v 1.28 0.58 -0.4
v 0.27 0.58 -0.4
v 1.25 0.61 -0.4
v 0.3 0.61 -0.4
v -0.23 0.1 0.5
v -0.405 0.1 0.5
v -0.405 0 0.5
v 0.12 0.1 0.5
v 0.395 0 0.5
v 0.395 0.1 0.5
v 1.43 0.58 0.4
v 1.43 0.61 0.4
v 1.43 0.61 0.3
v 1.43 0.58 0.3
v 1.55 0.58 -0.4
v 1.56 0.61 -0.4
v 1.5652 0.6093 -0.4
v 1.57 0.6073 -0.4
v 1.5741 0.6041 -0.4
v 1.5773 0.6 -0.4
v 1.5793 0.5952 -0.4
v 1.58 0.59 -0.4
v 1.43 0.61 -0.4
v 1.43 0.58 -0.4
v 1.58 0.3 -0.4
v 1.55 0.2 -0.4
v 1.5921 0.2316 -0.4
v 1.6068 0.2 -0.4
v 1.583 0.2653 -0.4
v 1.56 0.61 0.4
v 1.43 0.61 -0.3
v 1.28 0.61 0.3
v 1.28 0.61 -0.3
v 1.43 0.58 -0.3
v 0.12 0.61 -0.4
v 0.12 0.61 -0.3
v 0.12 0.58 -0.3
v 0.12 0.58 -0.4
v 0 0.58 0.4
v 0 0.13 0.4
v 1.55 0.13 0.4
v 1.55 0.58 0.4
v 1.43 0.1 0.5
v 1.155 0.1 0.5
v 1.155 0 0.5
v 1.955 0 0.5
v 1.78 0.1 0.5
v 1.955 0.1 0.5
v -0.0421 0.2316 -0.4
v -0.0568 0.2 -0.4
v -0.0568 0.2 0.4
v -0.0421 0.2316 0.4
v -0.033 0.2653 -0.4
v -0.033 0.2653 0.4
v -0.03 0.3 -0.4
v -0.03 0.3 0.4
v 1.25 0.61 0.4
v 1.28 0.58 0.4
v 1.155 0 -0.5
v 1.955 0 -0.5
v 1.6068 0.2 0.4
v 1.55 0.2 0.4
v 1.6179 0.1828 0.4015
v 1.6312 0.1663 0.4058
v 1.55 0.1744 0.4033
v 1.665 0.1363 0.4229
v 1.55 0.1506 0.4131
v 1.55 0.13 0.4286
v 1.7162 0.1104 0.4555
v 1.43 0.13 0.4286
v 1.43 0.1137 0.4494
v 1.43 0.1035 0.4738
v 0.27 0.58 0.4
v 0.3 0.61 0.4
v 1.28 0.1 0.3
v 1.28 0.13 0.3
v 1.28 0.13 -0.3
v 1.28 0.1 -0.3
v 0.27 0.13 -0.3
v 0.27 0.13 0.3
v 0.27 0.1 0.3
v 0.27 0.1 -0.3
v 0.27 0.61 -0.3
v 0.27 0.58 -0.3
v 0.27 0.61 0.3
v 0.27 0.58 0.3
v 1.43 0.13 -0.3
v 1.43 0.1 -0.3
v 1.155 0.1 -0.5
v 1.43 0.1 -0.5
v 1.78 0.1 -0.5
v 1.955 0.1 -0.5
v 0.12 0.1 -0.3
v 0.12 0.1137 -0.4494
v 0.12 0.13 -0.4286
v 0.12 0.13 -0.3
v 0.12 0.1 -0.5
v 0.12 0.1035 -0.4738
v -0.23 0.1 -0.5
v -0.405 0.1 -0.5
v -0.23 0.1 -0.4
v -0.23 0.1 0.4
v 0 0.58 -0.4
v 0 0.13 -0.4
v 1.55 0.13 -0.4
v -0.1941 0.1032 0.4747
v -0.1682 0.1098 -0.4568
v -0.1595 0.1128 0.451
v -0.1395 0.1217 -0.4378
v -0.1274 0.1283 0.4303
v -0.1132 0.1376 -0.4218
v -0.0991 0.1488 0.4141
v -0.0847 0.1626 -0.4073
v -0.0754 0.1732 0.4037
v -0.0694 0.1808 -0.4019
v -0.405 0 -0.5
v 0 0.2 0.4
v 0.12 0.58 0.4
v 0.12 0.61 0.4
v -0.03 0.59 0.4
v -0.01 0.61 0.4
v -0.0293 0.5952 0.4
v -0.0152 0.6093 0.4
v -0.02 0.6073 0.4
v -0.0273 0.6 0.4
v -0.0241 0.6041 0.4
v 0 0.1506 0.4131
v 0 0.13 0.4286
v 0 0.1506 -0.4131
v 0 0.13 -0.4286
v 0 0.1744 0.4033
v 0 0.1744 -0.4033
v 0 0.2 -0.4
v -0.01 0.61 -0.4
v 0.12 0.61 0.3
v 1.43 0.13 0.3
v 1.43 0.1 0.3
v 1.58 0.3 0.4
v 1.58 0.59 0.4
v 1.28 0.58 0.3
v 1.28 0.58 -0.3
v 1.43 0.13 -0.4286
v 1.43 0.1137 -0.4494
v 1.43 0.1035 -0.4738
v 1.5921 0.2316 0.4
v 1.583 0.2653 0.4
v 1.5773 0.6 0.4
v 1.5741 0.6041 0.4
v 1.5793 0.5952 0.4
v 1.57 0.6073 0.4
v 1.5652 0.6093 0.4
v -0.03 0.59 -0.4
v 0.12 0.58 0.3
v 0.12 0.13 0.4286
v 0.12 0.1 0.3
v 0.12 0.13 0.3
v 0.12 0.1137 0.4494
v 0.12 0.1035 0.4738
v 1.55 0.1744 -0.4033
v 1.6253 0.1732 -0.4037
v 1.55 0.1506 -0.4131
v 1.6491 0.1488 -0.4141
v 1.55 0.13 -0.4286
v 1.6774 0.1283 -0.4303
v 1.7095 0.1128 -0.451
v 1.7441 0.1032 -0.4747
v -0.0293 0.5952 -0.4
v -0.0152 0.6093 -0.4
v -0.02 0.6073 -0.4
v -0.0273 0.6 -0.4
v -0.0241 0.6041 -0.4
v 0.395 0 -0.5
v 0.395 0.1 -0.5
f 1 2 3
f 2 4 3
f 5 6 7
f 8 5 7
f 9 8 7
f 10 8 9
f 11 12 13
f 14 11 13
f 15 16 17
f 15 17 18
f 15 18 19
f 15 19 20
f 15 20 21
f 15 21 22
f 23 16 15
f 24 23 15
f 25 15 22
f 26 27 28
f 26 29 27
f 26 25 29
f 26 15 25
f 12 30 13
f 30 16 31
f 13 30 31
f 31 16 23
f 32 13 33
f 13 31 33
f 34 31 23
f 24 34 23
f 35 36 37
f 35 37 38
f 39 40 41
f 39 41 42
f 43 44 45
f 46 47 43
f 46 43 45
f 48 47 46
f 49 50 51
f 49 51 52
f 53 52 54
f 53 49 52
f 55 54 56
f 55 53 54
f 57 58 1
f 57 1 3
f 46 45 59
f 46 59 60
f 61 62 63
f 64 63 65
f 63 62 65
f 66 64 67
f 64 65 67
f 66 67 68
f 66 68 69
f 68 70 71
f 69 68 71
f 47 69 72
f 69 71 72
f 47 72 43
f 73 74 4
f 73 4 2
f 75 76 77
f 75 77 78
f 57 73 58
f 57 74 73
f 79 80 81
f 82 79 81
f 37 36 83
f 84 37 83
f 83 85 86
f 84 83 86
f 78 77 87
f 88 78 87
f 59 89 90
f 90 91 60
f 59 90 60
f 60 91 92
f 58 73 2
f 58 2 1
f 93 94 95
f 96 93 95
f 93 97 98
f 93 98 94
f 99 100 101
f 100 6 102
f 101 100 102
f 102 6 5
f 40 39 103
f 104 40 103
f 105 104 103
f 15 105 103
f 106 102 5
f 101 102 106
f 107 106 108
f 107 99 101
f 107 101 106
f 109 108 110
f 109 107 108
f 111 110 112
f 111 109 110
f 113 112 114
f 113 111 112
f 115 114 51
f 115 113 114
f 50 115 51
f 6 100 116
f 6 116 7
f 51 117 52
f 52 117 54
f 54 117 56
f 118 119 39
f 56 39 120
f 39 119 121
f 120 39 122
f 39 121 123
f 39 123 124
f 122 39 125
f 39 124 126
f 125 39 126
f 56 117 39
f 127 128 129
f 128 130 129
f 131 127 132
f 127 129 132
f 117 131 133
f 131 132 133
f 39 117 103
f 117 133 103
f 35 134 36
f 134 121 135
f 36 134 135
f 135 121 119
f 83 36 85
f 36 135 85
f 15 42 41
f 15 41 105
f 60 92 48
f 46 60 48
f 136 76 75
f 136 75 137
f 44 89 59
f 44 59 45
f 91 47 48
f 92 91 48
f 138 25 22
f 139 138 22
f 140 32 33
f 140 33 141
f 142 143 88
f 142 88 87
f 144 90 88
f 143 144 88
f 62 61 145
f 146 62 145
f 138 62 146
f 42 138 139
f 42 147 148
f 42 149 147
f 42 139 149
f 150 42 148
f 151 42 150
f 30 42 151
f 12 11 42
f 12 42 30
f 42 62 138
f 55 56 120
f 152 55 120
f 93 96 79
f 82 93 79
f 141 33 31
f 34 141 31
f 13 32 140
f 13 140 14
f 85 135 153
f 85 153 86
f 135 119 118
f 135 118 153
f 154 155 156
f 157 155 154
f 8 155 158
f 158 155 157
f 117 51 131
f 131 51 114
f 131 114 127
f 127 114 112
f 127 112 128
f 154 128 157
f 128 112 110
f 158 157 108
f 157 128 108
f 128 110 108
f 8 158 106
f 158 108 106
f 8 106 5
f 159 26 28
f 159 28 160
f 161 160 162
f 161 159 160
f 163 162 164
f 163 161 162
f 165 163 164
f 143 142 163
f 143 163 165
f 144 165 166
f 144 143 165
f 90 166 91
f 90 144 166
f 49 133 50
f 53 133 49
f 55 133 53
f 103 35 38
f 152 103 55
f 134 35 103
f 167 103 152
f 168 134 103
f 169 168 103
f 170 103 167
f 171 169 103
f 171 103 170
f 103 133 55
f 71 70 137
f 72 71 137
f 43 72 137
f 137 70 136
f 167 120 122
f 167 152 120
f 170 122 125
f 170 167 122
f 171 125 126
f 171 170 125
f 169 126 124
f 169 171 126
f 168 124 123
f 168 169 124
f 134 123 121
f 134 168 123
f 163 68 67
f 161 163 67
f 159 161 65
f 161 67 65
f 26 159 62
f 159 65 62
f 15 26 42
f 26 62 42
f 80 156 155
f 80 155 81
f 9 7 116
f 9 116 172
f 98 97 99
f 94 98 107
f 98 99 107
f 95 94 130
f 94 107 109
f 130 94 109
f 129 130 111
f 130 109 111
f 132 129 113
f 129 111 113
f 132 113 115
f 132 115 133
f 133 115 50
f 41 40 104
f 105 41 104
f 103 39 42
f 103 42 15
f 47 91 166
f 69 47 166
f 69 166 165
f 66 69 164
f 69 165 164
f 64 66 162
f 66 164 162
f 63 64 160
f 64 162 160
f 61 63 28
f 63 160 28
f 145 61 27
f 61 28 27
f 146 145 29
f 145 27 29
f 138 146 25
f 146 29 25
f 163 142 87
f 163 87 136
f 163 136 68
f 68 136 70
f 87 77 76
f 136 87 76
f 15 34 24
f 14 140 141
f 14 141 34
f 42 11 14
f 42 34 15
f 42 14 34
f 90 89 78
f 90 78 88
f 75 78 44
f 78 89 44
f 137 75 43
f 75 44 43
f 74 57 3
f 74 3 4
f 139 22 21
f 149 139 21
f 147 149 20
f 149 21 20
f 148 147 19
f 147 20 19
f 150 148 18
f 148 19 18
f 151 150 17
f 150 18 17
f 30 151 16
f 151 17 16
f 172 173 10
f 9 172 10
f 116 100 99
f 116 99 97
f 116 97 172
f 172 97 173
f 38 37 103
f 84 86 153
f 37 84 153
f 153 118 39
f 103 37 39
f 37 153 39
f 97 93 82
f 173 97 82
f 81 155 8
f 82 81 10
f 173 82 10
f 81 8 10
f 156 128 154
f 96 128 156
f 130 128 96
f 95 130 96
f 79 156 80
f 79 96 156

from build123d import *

# Parameters (mm, degrees)
SKETCH1_W             = 0.8
SKETCH1_H             = 0.45
BOSS_EXTRUDE1_DEPTH   = 1.55
BOSS_EXTRUDE2_DEPTH   = 0.8
BOSS_EXTRUDE2_2_DEPTH = 0.8
FILLET1_R             = 0.02
FILLET2_R             = 0.02
SKETCH3_W             = 0.15
SKETCH3_H             = 0.1
CUT_EXTRUDE1_DEPTH    = 2.707776332
BOSS_EXTRUDE3_DEPTH   = 0.8
SKETCH5_W             = 0.8
SKETCH5_H             = 1
BOSS_EXTRUDE4_DEPTH   = 0.1
FILLET3_R             = 0.2
FILLET4_R             = 0.2
FILLET5_START         = -0.087971281
FILLET5_DEPTH         = 0.087971281
FILLET5_START_2       = -0.2300001
FILLET5_2_DEPTH       = 0.142028819
FILLET5_START_3       = -0.0299999
FILLET5_3_DEPTH       = 0.1499999
FILLET5_START_4       = -2
FILLET5_4_OUTLINE_W   = 0.12
FILLET5_4_OUTLINE_H   = 0.07
FILLET5_4_DEPTH       = 3
FILLET6_START         = 1.43
FILLET6_DEPTH         = 0.209188627
FILLET6_START_2       = 1.55
FILLET6_2_DEPTH       = 0.0299999
FILLET6_START_3       = -0.5
FILLET6_3_DEPTH       = 1
FILLET6_START_4       = -0.3
FILLET6_4_OUTLINE_W   = 0.359188627
FILLET6_4_OUTLINE_H   = 0.03
FILLET6_4_OUTLINE_W_2 = 0.15
FILLET6_4_DEPTH       = 0.6
FILLET6_5_OUTLINE_W   = 0.209188627
FILLET6_5_OUTLINE_H   = 0.03
FILLET6_5_DEPTH       = 0.9
FILLET6_6_DEPTH       = 0.35


with BuildPart() as part:
    # Sketch1 → Boss-Extrude1 (new body)
    with BuildSketch(Plane(origin=(0, 0, 0), x_dir=(0, 0, -1), z_dir=(1, 0, 0))):
        with Locations((0, 0.355)):
            Rectangle(SKETCH1_W, SKETCH1_H)
    extrude(amount=BOSS_EXTRUDE1_DEPTH)


with BuildPart() as body_2:
    # Sketch2 → Boss-Extrude2 (new body)
    with BuildSketch(Plane.XY.offset(0.4)):
        Polygon((0.27, 0.58), (0, 0.58), (0, 0.13), (0.27, 0.13), (0.27, 0.1), (-0.03, 0.1), (-0.03, 0.61), (0.27, 0.61), align=None)
    extrude(amount=-BOSS_EXTRUDE2_DEPTH)

    # Fillet2
    fillet2_edges = [body_2.edges().sort_by_distance(p)[0] for p in [
        (-0.03, 0.61, 0),
    ]]
    fillet(fillet2_edges, radius=FILLET2_R)


with BuildPart() as body_3:
    # Sketch2 → Boss-Extrude2 2 (new body)
    with BuildSketch(Plane.XY.offset(0.4)):
        Polygon((1.28, 0.13), (1.28, 0.1), (1.58, 0.1), (1.58, 0.61), (1.28, 0.61), (1.28, 0.58), (1.55, 0.58), (1.55, 0.13), align=None)
    extrude(amount=-BOSS_EXTRUDE2_2_DEPTH)

    # Fillet1
    fillet1_edges = [body_3.edges().sort_by_distance(p)[0] for p in [
        (1.58, 0.61, 0),
    ]]
    fillet(fillet1_edges, radius=FILLET1_R)


with BuildPart() as cut_extrude1_tool:
    # Sketch3 → Cut-Extrude1 (new, through all)
    with BuildSketch(Plane(origin=(0, 0.61, 0), x_dir=(1, 0, 0), z_dir=(0, 1, 0))):
        with Locations((0.195, 0.35)):
            Rectangle(SKETCH3_W, SKETCH3_H)
        with Locations((1.355, 0.35)):
            Rectangle(SKETCH3_W, SKETCH3_H)
        with Locations((1.355, -0.35)):
            Rectangle(SKETCH3_W, SKETCH3_H)
        with Locations((0.195, -0.35)):
            Rectangle(SKETCH3_W, SKETCH3_H)
    extrude(amount=-CUT_EXTRUDE1_DEPTH)


with BuildPart() as body_2_1:
    add(body_2.part)

    # Cut-Extrude1: cut by cut_extrude1_tool
    add(cut_extrude1_tool.part, mode=Mode.SUBTRACT)



with BuildPart() as body_3_1:
    add(body_3.part)

    # Cut-Extrude1: cut by cut_extrude1_tool
    add(cut_extrude1_tool.part, mode=Mode.SUBTRACT)


with BuildPart() as body_4:
    # Sketch4 → Boss-Extrude3 (new body)
    with BuildSketch(Plane.XY.offset(0.4)):
        Polygon((0.27, 0.58), (1.28, 0.58), (1.25, 0.61), (0.3, 0.61), align=None)
    extrude(amount=-BOSS_EXTRUDE3_DEPTH)


with BuildPart() as body_2_2:
    add(body_2_1.part)

    add(body_3_1.part)  # Boss-Extrude4 merges body 3
    # Sketch5 → Boss-Extrude4 (add)
    with BuildSketch(Plane.XZ.offset(-0.1)):
        with Locations((-0.005, 0)):
            Rectangle(SKETCH5_W, SKETCH5_H)
        with Locations((1.555, 0)):
            Rectangle(SKETCH5_W, SKETCH5_H)
    extrude(amount=BOSS_EXTRUDE4_DEPTH)

    # Fillet3
    fillet3_edges = [body_2_2.edges().sort_by_distance(p)[0] for p in [
        (-0.03, 0.1, 0),
    ]]
    fillet(fillet3_edges, radius=FILLET3_R)

    # Fillet4
    fillet4_edges = [body_2_2.edges().sort_by_distance(p)[0] for p in [
        (1.58, 0.1, 0),
    ]]
    fillet(fillet4_edges, radius=FILLET4_R)

    # Fillet5: read off the stored shape, not the designer's step
    # Fillet5 outline → Fillet5 (add)
    with BuildSketch(Plane.YZ.offset(FILLET5_START)):
        with BuildLine():
            Line((0.1, 0.5), (0.1, 0.4))
            Line((0.1, 0.4), (0.2, 0.4))
            ThreePointArc((0.2, 0.4), (0.129289322, 0.429289322), (0.1, 0.5))
        make_face()
        with BuildLine():
            ThreePointArc((0.1, -0.5), (0.129289322, -0.429289322), (0.2, -0.4))
            Line((0.2, -0.4), (0.1, -0.4))
            Line((0.1, -0.4), (0.1, -0.5))
        make_face()
    extrude(amount=FILLET5_DEPTH)

    # Fillet5 2 outline → Fillet5 2 (add)
    with BuildSketch(Plane.YZ.offset(FILLET5_START_2)):
        with BuildLine():
            Line((0.1, 0.5), (0.1, 0.4))
            Line((0.1, 0.4), (0.2, 0.4))
            ThreePointArc((0.2, 0.4), (0.129289322, 0.429289322), (0.1, 0.5))
        make_face()
        with BuildLine():
            ThreePointArc((0.1, -0.5), (0.129289322, -0.429289322), (0.2, -0.4))
            Line((0.2, -0.4), (0.1, -0.4))
            Line((0.1, -0.4), (0.1, -0.5))
        make_face()
    extrude(amount=FILLET5_2_DEPTH)

    # Fillet5 3 outline → Fillet5 3 (add)
    with BuildSketch(Plane.YZ.offset(FILLET5_START_3)):
        with BuildLine():
            Line((0.1, 0.5), (0.1, 0.4))
            Line((0.1, 0.4), (0.2, 0.4))
            ThreePointArc((0.2, 0.4), (0.129289322, 0.429289322), (0.1, 0.5))
        make_face()
        with BuildLine():
            ThreePointArc((0.1, -0.5), (0.129289322, -0.429289322), (0.2, -0.4))
            Line((0.2, -0.4), (0.1, -0.4))
            Line((0.1, -0.4), (0.1, -0.5))
        make_face()
    extrude(amount=FILLET5_3_DEPTH)

    # Fillet5 4 outline → Fillet5 4 (cut)
    with BuildSketch(Plane.XY.offset(FILLET5_START_4)):
        with Locations((0.06, 0.165)):
            Rectangle(FILLET5_4_OUTLINE_W, FILLET5_4_OUTLINE_H)
        with BuildLine():
            Line((-0.2300001, 0.2), (-0.23000005, 0.1))
            ThreePointArc((-0.23000005, 0.1), (-0.130000022, 0.126794907), (-0.056794919, 0.2))
            Line((-0.056794919, 0.2), (-0.2300001, 0.2))
        make_face()
    extrude(amount=FILLET5_4_DEPTH, mode=Mode.SUBTRACT)

    # Fillet6: read off the stored shape, not the designer's step
    # Fillet6 outline → Fillet6 (add)
    with BuildSketch(Plane.YZ.offset(FILLET6_START)):
        with BuildLine():
            ThreePointArc((0.1, -0.5), (0.107804555, -0.461270167), (0.13, -0.428585716))
            Line((0.13, -0.428585716), (0.13, -0.4))
            Line((0.13, -0.4), (0.1, -0.4))
            Line((0.1, -0.4), (0.1, -0.5))
        make_face()
        with BuildLine():
            Line((0.1, 0.4), (0.13, 0.4))
            Line((0.13, 0.4), (0.13, 0.428585716))
            ThreePointArc((0.13, 0.428585716), (0.107804555, 0.461270167), (0.1, 0.5))
            Line((0.1, 0.5), (0.1, 0.4))
        make_face()
    extrude(amount=FILLET6_DEPTH)

    # Fillet6 2 outline → Fillet6 2 (add)
    with BuildSketch(Plane.YZ.offset(FILLET6_START_2)):
        with BuildLine():
            ThreePointArc((0.13, -0.428585716), (0.162194104, -0.407421848), (0.2, -0.4))
            Line((0.2, -0.4), (0.13, -0.4))
            Line((0.13, -0.4), (0.13, -0.428585716))
        make_face()
        with BuildLine():
            Line((0.13, 0.428585716), (0.13, 0.4))
            Line((0.13, 0.4), (0.2, 0.4))
            ThreePointArc((0.2, 0.4), (0.162194104, 0.407421848), (0.13, 0.428585716))
        make_face()
    extrude(amount=FILLET6_2_DEPTH)

    # Fillet6 3 outline → Fillet6 3 (add)
    with BuildSketch(Plane.XY.offset(FILLET6_START_3)):
        with BuildLine():
            Line((1.639188627, 0.1), (1.155, 0.1))
            Line((1.155, 0.1), (1.155, 0))
            Line((1.155, 0), (1.955, 0))
            Line((1.955, 0), (1.955, 0.1))
            Line((1.955, 0.1), (1.78, 0.1))
            ThreePointArc((1.78, 0.1), (1.638578644, 0.158578644), (1.58, 0.3))
            Line((1.58, 0.3), (1.58, 0.59))
            ThreePointArc((1.58, 0.59), (1.574142136, 0.604142136), (1.56, 0.61))
            Line((1.56, 0.61), (1.43, 0.61))
            Line((1.43, 0.61), (1.43, 0.58))
            Line((1.43, 0.58), (1.55, 0.58))
            Line((1.55, 0.58), (1.55, 0.13))
            Line((1.55, 0.13), (1.5799999, 0.13))
            Line((1.5799999, 0.13), (1.639188627, 0.13))
            Line((1.639188627, 0.13), (1.639188627, 0.1))
        make_face()
    extrude(amount=FILLET6_3_DEPTH)

    # Fillet6 4 outline → Fillet6 4 (add)
    with BuildSketch(Plane.XY.offset(FILLET6_START_4)):
        with Locations((1.459594314, 0.115)):
            Rectangle(FILLET6_4_OUTLINE_W, FILLET6_4_OUTLINE_H)
        with Locations((1.355, 0.595)):
            Rectangle(FILLET6_4_OUTLINE_W_2, FILLET6_4_OUTLINE_H)
    extrude(amount=FILLET6_4_DEPTH)

    # Fillet6 5 outline → Fillet6 5 (add)
    with BuildSketch(Plane.XY.offset(FILLET6_START_3)):
        with Locations((1.534594313, 0.115)):
            Rectangle(FILLET6_5_OUTLINE_W, FILLET6_5_OUTLINE_H)
    extrude(amount=FILLET6_5_DEPTH)

    # Fillet6 6 outline → Fillet6 6 (cut)
    with BuildSketch(Plane.YZ.offset(FILLET6_START)):
        with BuildLine():
            Line((0.2, 0.4), (0.61, 0.4))
            Line((0.61, 0.4), (0.61, 0.5))
            Line((0.61, 0.5), (0.1, 0.5))
            ThreePointArc((0.1, 0.5), (0.129289322, 0.429289322), (0.2, 0.4))
        make_face()
        with BuildLine():
            Line((0.1, -0.5), (0.61, -0.5))
            Line((0.61, -0.5), (0.61, -0.4))
            Line((0.61, -0.4), (0.2, -0.4))
            ThreePointArc((0.2, -0.4), (0.129289322, -0.429289322), (0.1, -0.5))
        make_face()
    extrude(amount=FILLET6_6_DEPTH, mode=Mode.SUBTRACT)


solid = Compound([part.part, body_4.part, body_2_2.part])
